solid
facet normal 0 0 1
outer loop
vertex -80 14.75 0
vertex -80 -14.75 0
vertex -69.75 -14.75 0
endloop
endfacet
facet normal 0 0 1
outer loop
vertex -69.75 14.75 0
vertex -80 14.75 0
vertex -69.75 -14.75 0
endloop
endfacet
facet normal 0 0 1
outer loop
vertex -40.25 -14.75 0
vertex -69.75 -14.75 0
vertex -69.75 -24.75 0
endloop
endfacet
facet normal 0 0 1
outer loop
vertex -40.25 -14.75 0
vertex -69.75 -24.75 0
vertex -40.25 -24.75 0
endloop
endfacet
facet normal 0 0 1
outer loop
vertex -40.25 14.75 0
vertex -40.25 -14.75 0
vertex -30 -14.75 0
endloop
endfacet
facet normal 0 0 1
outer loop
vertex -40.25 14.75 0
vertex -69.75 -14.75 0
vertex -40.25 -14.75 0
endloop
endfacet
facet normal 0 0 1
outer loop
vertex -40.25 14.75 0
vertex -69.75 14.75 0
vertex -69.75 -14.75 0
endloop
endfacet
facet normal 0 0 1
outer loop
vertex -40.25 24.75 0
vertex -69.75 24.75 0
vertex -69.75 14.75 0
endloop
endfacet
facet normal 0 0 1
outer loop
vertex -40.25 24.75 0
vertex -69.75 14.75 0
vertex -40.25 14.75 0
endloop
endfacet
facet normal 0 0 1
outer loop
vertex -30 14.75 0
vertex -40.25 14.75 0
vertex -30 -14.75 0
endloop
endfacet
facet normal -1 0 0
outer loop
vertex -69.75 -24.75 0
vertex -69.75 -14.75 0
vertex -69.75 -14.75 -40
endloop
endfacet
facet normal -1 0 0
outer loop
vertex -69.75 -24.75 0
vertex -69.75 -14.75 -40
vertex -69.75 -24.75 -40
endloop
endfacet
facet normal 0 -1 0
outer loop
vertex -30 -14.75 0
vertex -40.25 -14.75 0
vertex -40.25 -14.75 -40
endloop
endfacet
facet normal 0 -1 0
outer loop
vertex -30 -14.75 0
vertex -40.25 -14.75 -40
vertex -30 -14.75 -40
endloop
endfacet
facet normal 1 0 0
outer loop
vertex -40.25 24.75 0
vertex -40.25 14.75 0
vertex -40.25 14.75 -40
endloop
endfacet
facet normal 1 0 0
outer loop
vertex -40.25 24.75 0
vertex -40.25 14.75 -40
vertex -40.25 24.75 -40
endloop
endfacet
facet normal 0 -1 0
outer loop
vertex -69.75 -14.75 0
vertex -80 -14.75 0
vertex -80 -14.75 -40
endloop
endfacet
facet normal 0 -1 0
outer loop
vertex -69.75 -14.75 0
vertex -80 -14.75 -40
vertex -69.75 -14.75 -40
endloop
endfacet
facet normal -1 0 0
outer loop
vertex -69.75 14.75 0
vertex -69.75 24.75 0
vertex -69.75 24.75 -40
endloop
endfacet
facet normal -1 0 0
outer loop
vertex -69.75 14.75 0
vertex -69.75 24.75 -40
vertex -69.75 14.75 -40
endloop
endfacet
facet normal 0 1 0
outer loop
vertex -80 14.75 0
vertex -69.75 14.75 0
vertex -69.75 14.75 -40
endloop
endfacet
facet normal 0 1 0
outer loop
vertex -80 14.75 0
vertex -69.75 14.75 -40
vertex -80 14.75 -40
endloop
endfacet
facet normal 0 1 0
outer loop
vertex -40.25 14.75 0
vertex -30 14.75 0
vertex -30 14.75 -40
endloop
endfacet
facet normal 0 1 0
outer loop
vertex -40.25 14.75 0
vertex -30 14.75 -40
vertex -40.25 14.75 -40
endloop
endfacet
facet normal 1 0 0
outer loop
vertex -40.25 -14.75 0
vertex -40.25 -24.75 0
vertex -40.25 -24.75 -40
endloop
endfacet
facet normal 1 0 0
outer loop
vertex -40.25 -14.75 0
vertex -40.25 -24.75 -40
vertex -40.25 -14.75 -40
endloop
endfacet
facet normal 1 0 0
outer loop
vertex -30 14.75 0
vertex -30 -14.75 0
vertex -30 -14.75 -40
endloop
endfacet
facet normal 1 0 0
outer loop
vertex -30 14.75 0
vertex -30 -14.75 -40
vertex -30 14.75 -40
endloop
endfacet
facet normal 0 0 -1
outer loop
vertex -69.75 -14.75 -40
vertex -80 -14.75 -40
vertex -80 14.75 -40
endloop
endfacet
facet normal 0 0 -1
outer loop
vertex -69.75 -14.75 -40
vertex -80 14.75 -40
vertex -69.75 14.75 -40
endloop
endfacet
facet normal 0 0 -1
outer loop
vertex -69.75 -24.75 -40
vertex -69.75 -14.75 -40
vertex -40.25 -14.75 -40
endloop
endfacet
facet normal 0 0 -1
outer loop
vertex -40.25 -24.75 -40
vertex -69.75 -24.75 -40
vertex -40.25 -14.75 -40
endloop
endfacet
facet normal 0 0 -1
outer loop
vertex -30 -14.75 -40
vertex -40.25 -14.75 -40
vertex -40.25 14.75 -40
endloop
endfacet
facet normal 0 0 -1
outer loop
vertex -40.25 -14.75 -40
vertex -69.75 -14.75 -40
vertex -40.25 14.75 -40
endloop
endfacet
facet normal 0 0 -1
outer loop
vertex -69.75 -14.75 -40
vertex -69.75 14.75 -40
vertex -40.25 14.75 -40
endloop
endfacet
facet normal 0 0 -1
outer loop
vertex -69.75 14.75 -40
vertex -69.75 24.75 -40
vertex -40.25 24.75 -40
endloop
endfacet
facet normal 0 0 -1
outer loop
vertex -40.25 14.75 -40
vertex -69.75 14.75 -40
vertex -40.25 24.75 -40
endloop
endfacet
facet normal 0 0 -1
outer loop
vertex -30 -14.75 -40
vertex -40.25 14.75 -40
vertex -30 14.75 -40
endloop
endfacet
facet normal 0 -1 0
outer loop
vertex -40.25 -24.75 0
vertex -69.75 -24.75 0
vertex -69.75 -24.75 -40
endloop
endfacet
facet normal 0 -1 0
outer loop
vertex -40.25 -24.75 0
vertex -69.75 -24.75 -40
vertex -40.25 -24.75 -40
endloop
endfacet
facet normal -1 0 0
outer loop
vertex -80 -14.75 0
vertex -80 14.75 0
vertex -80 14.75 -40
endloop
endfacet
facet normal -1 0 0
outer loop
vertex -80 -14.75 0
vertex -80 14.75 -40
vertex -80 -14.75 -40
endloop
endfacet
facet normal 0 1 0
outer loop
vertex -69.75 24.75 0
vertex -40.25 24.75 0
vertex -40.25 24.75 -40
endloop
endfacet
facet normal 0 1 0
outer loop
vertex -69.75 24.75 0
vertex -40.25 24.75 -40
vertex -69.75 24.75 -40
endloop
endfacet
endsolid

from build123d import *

# Parameters (mm, degrees)
F5_DEPTH = 40
F6_DEPTH = 40


with BuildPart() as f5:
    # F4 (on Top) → F5 (new body)
    with BuildSketch(Plane.XY):
        Polygon((-30, 0), (-80, 0), (-80, -14.75), (-69.75, -14.75), (-69.75, -24.75), (-40.25, -24.75), (-40.25, -14.75), (-30, -14.75), align=None)
    extrude(amount=-F5_DEPTH)

    # F4 (on Top) → F6 (join)
    with BuildSketch(Plane.XY):
        Polygon((-69.75, 14.75), (-80, 14.75), (-80, 0), (-30, 0), (-30, 14.75), (-40.25, 14.75), (-40.25, 24.75), (-69.75, 24.75), align=None)
        Polygon((-30, 0), (-80, 0), (-80, -14.75), (-69.75, -14.75), (-69.75, -24.75), (-40.25, -24.75), (-40.25, -14.75), (-30, -14.75), align=None)
    extrude(amount=-F6_DEPTH)


solid = f5.part
